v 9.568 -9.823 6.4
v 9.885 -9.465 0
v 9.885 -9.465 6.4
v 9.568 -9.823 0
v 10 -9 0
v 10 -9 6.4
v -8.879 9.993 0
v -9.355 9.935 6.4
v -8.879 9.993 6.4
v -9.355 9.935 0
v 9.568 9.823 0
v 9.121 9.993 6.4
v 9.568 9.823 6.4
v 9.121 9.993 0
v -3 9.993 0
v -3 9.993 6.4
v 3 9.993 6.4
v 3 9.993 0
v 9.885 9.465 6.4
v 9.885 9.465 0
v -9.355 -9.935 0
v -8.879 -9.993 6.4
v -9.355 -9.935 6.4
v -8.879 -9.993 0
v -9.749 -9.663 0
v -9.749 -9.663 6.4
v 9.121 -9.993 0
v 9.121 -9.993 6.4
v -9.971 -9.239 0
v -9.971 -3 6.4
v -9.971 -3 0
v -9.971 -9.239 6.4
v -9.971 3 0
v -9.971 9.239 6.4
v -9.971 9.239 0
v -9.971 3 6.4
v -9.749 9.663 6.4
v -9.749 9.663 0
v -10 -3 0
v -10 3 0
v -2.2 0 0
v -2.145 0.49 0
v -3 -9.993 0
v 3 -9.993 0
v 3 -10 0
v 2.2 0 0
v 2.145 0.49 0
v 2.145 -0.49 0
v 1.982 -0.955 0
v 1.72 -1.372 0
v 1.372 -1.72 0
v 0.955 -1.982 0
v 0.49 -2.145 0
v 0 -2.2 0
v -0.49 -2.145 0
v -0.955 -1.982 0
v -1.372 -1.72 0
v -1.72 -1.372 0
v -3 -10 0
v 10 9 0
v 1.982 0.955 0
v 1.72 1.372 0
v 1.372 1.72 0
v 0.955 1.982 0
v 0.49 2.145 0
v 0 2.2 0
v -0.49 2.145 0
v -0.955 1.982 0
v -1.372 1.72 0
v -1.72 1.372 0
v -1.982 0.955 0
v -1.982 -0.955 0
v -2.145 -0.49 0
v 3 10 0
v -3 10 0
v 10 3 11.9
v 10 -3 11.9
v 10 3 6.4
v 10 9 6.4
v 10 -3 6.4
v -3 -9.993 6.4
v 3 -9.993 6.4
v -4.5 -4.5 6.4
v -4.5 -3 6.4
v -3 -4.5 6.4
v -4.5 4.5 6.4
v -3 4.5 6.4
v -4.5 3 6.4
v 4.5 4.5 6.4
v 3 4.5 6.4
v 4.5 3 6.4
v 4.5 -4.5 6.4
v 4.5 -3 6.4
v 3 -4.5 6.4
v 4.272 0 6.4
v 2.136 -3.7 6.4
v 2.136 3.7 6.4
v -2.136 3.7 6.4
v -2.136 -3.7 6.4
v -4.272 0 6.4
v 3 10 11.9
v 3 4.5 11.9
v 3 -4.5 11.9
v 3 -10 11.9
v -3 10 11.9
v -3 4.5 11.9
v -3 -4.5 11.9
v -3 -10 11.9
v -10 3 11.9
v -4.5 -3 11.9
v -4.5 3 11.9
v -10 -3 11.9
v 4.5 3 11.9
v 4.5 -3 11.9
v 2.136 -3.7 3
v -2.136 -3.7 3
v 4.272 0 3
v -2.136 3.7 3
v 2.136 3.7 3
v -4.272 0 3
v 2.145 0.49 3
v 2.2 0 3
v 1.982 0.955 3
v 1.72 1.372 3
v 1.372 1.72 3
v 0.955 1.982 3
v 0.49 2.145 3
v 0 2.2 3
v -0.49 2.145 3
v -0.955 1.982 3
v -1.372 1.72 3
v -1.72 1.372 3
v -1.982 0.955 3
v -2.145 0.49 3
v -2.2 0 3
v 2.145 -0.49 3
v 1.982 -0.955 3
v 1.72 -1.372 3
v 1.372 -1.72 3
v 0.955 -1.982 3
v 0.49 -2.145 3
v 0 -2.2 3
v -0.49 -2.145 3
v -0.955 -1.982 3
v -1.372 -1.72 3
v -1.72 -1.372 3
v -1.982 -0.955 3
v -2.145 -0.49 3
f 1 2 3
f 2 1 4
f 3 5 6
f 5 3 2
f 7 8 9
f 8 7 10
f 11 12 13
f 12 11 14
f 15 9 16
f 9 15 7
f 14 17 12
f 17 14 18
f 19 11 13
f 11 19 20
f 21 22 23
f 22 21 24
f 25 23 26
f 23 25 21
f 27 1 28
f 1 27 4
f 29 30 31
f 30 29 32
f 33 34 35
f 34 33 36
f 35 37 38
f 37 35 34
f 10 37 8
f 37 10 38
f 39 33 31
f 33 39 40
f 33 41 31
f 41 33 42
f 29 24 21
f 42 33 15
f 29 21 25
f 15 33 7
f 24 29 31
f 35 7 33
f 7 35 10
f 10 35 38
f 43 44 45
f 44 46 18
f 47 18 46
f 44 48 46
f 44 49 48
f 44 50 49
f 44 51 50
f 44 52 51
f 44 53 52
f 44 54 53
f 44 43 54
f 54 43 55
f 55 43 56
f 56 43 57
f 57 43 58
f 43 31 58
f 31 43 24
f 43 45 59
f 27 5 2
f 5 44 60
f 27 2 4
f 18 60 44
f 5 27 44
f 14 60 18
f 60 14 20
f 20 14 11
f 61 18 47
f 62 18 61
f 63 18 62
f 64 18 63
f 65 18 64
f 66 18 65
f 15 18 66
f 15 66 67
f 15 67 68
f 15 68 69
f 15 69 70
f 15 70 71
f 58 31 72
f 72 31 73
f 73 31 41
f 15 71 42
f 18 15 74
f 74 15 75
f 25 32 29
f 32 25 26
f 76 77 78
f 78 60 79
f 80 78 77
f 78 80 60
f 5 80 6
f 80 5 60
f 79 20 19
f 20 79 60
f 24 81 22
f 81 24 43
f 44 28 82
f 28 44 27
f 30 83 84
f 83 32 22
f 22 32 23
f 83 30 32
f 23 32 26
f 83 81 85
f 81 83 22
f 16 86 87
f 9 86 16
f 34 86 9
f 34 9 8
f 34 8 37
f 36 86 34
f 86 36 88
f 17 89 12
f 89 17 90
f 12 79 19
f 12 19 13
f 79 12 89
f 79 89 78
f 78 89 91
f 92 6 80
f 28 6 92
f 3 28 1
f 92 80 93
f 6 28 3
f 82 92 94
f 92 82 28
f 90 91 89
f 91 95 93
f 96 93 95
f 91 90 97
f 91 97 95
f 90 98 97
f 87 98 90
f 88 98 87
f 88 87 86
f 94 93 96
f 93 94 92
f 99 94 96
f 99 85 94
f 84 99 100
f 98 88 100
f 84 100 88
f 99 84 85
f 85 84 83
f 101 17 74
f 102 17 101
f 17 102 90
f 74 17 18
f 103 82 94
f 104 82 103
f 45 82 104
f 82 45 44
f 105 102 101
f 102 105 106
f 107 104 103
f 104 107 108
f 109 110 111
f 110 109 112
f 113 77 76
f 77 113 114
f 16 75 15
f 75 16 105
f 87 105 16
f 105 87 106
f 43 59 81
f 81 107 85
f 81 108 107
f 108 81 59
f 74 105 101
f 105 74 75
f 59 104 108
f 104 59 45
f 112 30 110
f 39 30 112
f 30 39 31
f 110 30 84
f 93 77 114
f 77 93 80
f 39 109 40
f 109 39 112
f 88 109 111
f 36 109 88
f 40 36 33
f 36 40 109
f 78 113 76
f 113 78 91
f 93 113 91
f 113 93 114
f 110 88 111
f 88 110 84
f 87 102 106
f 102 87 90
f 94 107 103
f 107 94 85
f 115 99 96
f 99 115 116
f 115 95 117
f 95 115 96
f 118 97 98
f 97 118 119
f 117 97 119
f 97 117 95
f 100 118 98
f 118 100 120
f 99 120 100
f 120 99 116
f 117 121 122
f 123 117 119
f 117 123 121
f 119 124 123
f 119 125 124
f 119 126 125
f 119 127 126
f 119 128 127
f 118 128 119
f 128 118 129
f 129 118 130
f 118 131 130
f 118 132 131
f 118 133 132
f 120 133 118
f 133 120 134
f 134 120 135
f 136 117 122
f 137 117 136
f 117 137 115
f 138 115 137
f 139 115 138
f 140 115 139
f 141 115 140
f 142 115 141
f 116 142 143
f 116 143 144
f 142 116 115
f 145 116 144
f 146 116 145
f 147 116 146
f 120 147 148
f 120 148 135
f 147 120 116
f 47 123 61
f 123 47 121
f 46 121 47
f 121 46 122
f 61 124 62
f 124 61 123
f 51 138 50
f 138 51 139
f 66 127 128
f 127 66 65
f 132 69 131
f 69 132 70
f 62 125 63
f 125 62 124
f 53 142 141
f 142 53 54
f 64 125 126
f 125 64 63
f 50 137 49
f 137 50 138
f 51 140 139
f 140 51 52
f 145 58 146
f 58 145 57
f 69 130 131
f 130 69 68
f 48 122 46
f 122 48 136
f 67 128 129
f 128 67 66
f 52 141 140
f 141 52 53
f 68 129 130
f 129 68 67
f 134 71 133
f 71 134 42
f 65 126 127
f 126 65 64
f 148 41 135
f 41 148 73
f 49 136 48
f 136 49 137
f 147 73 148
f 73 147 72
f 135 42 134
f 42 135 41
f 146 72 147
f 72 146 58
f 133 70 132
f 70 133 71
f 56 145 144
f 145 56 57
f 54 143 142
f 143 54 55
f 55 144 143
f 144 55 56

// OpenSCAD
// file: functions.scad
/*******************************************************************

This OpenSCAD code and its rendered 3D model are part of the

	Kühling&Kühling RepRap Industrial 3D Printer


All details, BOM, assembling instructions and latest sources:
	http://kuehlingkuehling.de

Designed and developed by:
	Jonas Kühling <mail@jonaskuehling.de>
	Simon Kühling <mail@simonkuehling.de>

Licensed under:
	Creative Commons Attribution-ShareAlike
	CC BY-SA 3.0
	http://creativecommons.org/licenses/by-sa/3.0/

*******************************************************************/

module teardrop (r=4.5,h=20,alpha=45,teardropcorner=0,fulldrop=0){		// tear drop hole for top-centering
											// use teardropcorner=1 for bottom horizontal corners
	render()
	translate([-h/2,0,0])
		rotate([-270,0+(teardropcorner*180),90])
			difference(){
				linear_extrude(height=h){
					circle(r);
					polygon(points=[[0,0],[r*cos(alpha),r*sin(alpha)],[0,r/sin(alpha)],[-r*cos(alpha),r*sin(alpha)]], paths=[[0,1,2,3]]);
				}
				if(fulldrop==0) 
					translate([0,(r/sin(alpha))/2+r,h/2]) cube([2*r+2,r/sin(alpha),h+2],center=true);
			}
}

//teardrop(4.5,22,fulldrop=true);



module teardropcentering (r=4.5,h=20,alpha=45){				// tear drop hole for top-centering
	centering_offset_factor = 1.1;
	render()
	translate([-h/2,0,0])
		rotate([-270,0,90])
			difference(){
				linear_extrude(height=h){
					circle(r, $fn=24);
					polygon(points=[[0,0],[r*cos(alpha),r*sin(alpha)],[0,r/sin(alpha)],[-r*cos(alpha),r*sin(alpha)]], paths=[[0,1,2,3]]);
				}
				translate([0,(r/sin(alpha))/2+r*centering_offset_factor,h/2]) cube([2*r+2,r/sin(alpha),h+2],center=true);
			}
}

//teardropcentering();



module teardropcentering_half (r=4.5,h=20, bottom=0,alpha=45){				// tear drop hole for top-centering
																// upper half (bottom=0) or bottom half (bottom=1)
	centering_offset_factor = 1.2;
	render()
	translate([-h/2,0,0])
		rotate([-270,0,90])
			difference(){
				linear_extrude(height=h){
					circle(r, $fn=24);
					polygon(points=[[0,0],[r*cos(alpha),r*sin(alpha)],[0,r/sin(alpha)],[-r*cos(alpha),r*sin(alpha)]], paths=[[0,1,2,3]]);
				}
				translate([0,(r/sin(alpha))/2+r*centering_offset_factor,h/2]) cube([2*r+2,r/sin(alpha),h+2],center=true);
				translate([0,-(r*centering_offset_factor)/2-0.5+bottom*(r*centering_offset_factor+1),h/2]) cube([2*r+2,r*centering_offset_factor+1,h+2],center=true);
			}
}

//teardropcentering_half(bottom=0);


module polyhole(d,h){
	n = max(round(2 * d),3);
	cylinder(h = h, r = (d / 2) / cos (180 / n), $fn = n, center=true);
}



module roundcorner(radius,edge_length){
	render()
	translate([0,0,-1])
		difference(){
			translate([-1,-1,0])
				cube(size = [radius+1,radius+1,edge_length+2], center = false);
			translate(v = [radius,radius,-1])
				cylinder(h = edge_length+4, r=radius, center=false,$fs=0.1);
		}
}

//roundcorner(5,5);



module roundcorner_tear(radius,edge_length){
	render()
	difference(){
		translate([-1,-1,-1])
			cube(size = [edge_length+2, radius+1, radius+1], center = false);
		translate([(edge_length+4)/2-2, radius, radius])
			teardrop(radius, edge_length+4,teardropcorner=1);
	}
}

//roundcorner_tear(8,20);


module roundedge_tear(radius){
	render()
	difference(){
		translate([-1,-1,-1])
			cube(size = [radius+1, radius+1, radius+1], center = false);
		translate([radius,radius,radius])
			union(){
				sphere(r=radius, $fs=0.1);
				translate([0,0,-radius])
					cylinder(r1=(radius*sin(45))-(radius-(radius*sin(45))),r2=radius*sin(45),h=(radius-(radius*sin(45))), $fs=0.1);
			}
	}
}

//roundedge_tear(20);



module roundedge(radius){
	render()
	difference(){
		translate([-1,-1,-1])
			cube(size = [radius+1, radius+1, radius+1], center = false);
		translate([radius,radius,radius])
			sphere(r=radius, $fs=0.1);
	}
}

//roundedge(5);


module nut_trap(nut_wrench_size,trap_height,vertical=0, clearance=0.2,center=true){		// M3 wrench size = 5.5
	radius = cornerdiameter(nut_wrench_size+2*clearance) /2;
	rotate([0,vertical*90,0])
		cylinder(h = trap_height, r = radius, center=center, $fn = 6);
}

//nut_trap(5,5,0);

module nut_slot(nut_wrench_size,nut_height, nut_elevation,vertical=0, clearance=0.2){		// M3 wrench size = 5.5
	radius = cornerdiameter(nut_wrench_size+2*clearance) /2;
	slot_height = nut_height+2*clearance;
	slot_width = nut_wrench_size+2*clearance;
	rotate([0,vertical*270,0]){
		cylinder(h = slot_height, r = radius, center=true, $fn = 6);
		translate([0,-slot_width/2,-slot_height/2]) cube([nut_elevation+1,slot_width,slot_height]);
	}
}

//nut_slot(5.5,3,4,1);

function cornerdiameter(wrench_size) =  2* ((wrench_size)/2)/ cos(180/6);
function cornerdiameter_8(wrench_size) =  2* ((wrench_size)/2)/ cos(180/8);
// main file
/*******************************************************************

This OpenSCAD code and its rendered 3D model are part of the

	Kühling&Kühling RepRap Industrial 3D Printer


All details, BOM, assembling instructions and latest sources:
	http://kuehlingkuehling.de

Designed and developed by:
	Jonas Kühling <mail@jonaskuehling.de>
	Simon Kühling <mail@simonkuehling.de>

Licensed under:
	Creative Commons Attribution-ShareAlike
	CC BY-SA 3.0
	http://creativecommons.org/licenses/by-sa/3.0/

*******************************************************************/

include <configuration.scad>


foot_nut();

//foot_screw();


module foot_nut(){
	difference(){
		// main body
		union(){
			hull(){
				translate([frame_width/2-wall_thin,frame_width/2-wall_thin,0])
					cylinder(r=wall_thin,h=wall+frame_screw_nut_height+clearance);
				translate([-(frame_width/2-wall_thin),(frame_width/2-wall_thin),0])
					cylinder(r=wall_thin,h=wall+frame_screw_nut_height+clearance);
				translate([(frame_width/2-wall_thin),-(frame_width/2-wall_thin),0])
					cylinder(r=wall_thin,h=wall+frame_screw_nut_height+clearance);
				translate([-(frame_width/2-wall_thin),-(frame_width/2-wall_thin),0])
					cylinder(r=wall_thin,h=wall+frame_screw_nut_height+clearance);
			}
			translate([-frame_groove_width/2,-frame_width/2,0])
				cube([frame_groove_width,frame_width,wall+frame_screw_nut_height+clearance+frame_groove_depth]);
			rotate([0,0,90])
				translate([-frame_groove_width/2,-frame_width/2,0])
					cube([frame_groove_width,frame_width,wall+frame_screw_nut_height+clearance+frame_groove_depth]);
		}

		// frame core clearance
		translate([-(frame_width-2*frame_groove_depth)/2,-(frame_width-2*frame_groove_depth)/2,wall+frame_screw_nut_height+clearance])
			cube([frame_width-2*frame_groove_depth,frame_width-2*frame_groove_depth,frame_groove_depth+1]);

		// foot screw nut trap
		translate([0,0,(frame_screw_nut_height+clearance+1)/2+wall])
			nut_trap(frame_foot_screw_nut_wrench,frame_foot_screw_nut_height+clearance+1);

		// foot screw hole
		translate([0,0,-1])
			cylinder(r=frame_foot_screw_dia/2+clearance,h=wall+2);
	}
}


module foot_screw(){
	difference(){
		// main body
		cylinder(r=frame_width/2,h=wall+frame_foot_screw_head_wrench_length+clearance);

		// foot screw hex head trap
		translate([0,0,(frame_foot_screw_head_wrench_length+clearance+1)/2+wall])
			nut_trap(frame_foot_screw_head_wrench,frame_foot_screw_head_wrench_length+clearance+1);

		// foot screw hole
		translate([0,0,-1])
			cylinder(r=frame_foot_screw_dia/2+clearance,h=wall+2);
	}
}
